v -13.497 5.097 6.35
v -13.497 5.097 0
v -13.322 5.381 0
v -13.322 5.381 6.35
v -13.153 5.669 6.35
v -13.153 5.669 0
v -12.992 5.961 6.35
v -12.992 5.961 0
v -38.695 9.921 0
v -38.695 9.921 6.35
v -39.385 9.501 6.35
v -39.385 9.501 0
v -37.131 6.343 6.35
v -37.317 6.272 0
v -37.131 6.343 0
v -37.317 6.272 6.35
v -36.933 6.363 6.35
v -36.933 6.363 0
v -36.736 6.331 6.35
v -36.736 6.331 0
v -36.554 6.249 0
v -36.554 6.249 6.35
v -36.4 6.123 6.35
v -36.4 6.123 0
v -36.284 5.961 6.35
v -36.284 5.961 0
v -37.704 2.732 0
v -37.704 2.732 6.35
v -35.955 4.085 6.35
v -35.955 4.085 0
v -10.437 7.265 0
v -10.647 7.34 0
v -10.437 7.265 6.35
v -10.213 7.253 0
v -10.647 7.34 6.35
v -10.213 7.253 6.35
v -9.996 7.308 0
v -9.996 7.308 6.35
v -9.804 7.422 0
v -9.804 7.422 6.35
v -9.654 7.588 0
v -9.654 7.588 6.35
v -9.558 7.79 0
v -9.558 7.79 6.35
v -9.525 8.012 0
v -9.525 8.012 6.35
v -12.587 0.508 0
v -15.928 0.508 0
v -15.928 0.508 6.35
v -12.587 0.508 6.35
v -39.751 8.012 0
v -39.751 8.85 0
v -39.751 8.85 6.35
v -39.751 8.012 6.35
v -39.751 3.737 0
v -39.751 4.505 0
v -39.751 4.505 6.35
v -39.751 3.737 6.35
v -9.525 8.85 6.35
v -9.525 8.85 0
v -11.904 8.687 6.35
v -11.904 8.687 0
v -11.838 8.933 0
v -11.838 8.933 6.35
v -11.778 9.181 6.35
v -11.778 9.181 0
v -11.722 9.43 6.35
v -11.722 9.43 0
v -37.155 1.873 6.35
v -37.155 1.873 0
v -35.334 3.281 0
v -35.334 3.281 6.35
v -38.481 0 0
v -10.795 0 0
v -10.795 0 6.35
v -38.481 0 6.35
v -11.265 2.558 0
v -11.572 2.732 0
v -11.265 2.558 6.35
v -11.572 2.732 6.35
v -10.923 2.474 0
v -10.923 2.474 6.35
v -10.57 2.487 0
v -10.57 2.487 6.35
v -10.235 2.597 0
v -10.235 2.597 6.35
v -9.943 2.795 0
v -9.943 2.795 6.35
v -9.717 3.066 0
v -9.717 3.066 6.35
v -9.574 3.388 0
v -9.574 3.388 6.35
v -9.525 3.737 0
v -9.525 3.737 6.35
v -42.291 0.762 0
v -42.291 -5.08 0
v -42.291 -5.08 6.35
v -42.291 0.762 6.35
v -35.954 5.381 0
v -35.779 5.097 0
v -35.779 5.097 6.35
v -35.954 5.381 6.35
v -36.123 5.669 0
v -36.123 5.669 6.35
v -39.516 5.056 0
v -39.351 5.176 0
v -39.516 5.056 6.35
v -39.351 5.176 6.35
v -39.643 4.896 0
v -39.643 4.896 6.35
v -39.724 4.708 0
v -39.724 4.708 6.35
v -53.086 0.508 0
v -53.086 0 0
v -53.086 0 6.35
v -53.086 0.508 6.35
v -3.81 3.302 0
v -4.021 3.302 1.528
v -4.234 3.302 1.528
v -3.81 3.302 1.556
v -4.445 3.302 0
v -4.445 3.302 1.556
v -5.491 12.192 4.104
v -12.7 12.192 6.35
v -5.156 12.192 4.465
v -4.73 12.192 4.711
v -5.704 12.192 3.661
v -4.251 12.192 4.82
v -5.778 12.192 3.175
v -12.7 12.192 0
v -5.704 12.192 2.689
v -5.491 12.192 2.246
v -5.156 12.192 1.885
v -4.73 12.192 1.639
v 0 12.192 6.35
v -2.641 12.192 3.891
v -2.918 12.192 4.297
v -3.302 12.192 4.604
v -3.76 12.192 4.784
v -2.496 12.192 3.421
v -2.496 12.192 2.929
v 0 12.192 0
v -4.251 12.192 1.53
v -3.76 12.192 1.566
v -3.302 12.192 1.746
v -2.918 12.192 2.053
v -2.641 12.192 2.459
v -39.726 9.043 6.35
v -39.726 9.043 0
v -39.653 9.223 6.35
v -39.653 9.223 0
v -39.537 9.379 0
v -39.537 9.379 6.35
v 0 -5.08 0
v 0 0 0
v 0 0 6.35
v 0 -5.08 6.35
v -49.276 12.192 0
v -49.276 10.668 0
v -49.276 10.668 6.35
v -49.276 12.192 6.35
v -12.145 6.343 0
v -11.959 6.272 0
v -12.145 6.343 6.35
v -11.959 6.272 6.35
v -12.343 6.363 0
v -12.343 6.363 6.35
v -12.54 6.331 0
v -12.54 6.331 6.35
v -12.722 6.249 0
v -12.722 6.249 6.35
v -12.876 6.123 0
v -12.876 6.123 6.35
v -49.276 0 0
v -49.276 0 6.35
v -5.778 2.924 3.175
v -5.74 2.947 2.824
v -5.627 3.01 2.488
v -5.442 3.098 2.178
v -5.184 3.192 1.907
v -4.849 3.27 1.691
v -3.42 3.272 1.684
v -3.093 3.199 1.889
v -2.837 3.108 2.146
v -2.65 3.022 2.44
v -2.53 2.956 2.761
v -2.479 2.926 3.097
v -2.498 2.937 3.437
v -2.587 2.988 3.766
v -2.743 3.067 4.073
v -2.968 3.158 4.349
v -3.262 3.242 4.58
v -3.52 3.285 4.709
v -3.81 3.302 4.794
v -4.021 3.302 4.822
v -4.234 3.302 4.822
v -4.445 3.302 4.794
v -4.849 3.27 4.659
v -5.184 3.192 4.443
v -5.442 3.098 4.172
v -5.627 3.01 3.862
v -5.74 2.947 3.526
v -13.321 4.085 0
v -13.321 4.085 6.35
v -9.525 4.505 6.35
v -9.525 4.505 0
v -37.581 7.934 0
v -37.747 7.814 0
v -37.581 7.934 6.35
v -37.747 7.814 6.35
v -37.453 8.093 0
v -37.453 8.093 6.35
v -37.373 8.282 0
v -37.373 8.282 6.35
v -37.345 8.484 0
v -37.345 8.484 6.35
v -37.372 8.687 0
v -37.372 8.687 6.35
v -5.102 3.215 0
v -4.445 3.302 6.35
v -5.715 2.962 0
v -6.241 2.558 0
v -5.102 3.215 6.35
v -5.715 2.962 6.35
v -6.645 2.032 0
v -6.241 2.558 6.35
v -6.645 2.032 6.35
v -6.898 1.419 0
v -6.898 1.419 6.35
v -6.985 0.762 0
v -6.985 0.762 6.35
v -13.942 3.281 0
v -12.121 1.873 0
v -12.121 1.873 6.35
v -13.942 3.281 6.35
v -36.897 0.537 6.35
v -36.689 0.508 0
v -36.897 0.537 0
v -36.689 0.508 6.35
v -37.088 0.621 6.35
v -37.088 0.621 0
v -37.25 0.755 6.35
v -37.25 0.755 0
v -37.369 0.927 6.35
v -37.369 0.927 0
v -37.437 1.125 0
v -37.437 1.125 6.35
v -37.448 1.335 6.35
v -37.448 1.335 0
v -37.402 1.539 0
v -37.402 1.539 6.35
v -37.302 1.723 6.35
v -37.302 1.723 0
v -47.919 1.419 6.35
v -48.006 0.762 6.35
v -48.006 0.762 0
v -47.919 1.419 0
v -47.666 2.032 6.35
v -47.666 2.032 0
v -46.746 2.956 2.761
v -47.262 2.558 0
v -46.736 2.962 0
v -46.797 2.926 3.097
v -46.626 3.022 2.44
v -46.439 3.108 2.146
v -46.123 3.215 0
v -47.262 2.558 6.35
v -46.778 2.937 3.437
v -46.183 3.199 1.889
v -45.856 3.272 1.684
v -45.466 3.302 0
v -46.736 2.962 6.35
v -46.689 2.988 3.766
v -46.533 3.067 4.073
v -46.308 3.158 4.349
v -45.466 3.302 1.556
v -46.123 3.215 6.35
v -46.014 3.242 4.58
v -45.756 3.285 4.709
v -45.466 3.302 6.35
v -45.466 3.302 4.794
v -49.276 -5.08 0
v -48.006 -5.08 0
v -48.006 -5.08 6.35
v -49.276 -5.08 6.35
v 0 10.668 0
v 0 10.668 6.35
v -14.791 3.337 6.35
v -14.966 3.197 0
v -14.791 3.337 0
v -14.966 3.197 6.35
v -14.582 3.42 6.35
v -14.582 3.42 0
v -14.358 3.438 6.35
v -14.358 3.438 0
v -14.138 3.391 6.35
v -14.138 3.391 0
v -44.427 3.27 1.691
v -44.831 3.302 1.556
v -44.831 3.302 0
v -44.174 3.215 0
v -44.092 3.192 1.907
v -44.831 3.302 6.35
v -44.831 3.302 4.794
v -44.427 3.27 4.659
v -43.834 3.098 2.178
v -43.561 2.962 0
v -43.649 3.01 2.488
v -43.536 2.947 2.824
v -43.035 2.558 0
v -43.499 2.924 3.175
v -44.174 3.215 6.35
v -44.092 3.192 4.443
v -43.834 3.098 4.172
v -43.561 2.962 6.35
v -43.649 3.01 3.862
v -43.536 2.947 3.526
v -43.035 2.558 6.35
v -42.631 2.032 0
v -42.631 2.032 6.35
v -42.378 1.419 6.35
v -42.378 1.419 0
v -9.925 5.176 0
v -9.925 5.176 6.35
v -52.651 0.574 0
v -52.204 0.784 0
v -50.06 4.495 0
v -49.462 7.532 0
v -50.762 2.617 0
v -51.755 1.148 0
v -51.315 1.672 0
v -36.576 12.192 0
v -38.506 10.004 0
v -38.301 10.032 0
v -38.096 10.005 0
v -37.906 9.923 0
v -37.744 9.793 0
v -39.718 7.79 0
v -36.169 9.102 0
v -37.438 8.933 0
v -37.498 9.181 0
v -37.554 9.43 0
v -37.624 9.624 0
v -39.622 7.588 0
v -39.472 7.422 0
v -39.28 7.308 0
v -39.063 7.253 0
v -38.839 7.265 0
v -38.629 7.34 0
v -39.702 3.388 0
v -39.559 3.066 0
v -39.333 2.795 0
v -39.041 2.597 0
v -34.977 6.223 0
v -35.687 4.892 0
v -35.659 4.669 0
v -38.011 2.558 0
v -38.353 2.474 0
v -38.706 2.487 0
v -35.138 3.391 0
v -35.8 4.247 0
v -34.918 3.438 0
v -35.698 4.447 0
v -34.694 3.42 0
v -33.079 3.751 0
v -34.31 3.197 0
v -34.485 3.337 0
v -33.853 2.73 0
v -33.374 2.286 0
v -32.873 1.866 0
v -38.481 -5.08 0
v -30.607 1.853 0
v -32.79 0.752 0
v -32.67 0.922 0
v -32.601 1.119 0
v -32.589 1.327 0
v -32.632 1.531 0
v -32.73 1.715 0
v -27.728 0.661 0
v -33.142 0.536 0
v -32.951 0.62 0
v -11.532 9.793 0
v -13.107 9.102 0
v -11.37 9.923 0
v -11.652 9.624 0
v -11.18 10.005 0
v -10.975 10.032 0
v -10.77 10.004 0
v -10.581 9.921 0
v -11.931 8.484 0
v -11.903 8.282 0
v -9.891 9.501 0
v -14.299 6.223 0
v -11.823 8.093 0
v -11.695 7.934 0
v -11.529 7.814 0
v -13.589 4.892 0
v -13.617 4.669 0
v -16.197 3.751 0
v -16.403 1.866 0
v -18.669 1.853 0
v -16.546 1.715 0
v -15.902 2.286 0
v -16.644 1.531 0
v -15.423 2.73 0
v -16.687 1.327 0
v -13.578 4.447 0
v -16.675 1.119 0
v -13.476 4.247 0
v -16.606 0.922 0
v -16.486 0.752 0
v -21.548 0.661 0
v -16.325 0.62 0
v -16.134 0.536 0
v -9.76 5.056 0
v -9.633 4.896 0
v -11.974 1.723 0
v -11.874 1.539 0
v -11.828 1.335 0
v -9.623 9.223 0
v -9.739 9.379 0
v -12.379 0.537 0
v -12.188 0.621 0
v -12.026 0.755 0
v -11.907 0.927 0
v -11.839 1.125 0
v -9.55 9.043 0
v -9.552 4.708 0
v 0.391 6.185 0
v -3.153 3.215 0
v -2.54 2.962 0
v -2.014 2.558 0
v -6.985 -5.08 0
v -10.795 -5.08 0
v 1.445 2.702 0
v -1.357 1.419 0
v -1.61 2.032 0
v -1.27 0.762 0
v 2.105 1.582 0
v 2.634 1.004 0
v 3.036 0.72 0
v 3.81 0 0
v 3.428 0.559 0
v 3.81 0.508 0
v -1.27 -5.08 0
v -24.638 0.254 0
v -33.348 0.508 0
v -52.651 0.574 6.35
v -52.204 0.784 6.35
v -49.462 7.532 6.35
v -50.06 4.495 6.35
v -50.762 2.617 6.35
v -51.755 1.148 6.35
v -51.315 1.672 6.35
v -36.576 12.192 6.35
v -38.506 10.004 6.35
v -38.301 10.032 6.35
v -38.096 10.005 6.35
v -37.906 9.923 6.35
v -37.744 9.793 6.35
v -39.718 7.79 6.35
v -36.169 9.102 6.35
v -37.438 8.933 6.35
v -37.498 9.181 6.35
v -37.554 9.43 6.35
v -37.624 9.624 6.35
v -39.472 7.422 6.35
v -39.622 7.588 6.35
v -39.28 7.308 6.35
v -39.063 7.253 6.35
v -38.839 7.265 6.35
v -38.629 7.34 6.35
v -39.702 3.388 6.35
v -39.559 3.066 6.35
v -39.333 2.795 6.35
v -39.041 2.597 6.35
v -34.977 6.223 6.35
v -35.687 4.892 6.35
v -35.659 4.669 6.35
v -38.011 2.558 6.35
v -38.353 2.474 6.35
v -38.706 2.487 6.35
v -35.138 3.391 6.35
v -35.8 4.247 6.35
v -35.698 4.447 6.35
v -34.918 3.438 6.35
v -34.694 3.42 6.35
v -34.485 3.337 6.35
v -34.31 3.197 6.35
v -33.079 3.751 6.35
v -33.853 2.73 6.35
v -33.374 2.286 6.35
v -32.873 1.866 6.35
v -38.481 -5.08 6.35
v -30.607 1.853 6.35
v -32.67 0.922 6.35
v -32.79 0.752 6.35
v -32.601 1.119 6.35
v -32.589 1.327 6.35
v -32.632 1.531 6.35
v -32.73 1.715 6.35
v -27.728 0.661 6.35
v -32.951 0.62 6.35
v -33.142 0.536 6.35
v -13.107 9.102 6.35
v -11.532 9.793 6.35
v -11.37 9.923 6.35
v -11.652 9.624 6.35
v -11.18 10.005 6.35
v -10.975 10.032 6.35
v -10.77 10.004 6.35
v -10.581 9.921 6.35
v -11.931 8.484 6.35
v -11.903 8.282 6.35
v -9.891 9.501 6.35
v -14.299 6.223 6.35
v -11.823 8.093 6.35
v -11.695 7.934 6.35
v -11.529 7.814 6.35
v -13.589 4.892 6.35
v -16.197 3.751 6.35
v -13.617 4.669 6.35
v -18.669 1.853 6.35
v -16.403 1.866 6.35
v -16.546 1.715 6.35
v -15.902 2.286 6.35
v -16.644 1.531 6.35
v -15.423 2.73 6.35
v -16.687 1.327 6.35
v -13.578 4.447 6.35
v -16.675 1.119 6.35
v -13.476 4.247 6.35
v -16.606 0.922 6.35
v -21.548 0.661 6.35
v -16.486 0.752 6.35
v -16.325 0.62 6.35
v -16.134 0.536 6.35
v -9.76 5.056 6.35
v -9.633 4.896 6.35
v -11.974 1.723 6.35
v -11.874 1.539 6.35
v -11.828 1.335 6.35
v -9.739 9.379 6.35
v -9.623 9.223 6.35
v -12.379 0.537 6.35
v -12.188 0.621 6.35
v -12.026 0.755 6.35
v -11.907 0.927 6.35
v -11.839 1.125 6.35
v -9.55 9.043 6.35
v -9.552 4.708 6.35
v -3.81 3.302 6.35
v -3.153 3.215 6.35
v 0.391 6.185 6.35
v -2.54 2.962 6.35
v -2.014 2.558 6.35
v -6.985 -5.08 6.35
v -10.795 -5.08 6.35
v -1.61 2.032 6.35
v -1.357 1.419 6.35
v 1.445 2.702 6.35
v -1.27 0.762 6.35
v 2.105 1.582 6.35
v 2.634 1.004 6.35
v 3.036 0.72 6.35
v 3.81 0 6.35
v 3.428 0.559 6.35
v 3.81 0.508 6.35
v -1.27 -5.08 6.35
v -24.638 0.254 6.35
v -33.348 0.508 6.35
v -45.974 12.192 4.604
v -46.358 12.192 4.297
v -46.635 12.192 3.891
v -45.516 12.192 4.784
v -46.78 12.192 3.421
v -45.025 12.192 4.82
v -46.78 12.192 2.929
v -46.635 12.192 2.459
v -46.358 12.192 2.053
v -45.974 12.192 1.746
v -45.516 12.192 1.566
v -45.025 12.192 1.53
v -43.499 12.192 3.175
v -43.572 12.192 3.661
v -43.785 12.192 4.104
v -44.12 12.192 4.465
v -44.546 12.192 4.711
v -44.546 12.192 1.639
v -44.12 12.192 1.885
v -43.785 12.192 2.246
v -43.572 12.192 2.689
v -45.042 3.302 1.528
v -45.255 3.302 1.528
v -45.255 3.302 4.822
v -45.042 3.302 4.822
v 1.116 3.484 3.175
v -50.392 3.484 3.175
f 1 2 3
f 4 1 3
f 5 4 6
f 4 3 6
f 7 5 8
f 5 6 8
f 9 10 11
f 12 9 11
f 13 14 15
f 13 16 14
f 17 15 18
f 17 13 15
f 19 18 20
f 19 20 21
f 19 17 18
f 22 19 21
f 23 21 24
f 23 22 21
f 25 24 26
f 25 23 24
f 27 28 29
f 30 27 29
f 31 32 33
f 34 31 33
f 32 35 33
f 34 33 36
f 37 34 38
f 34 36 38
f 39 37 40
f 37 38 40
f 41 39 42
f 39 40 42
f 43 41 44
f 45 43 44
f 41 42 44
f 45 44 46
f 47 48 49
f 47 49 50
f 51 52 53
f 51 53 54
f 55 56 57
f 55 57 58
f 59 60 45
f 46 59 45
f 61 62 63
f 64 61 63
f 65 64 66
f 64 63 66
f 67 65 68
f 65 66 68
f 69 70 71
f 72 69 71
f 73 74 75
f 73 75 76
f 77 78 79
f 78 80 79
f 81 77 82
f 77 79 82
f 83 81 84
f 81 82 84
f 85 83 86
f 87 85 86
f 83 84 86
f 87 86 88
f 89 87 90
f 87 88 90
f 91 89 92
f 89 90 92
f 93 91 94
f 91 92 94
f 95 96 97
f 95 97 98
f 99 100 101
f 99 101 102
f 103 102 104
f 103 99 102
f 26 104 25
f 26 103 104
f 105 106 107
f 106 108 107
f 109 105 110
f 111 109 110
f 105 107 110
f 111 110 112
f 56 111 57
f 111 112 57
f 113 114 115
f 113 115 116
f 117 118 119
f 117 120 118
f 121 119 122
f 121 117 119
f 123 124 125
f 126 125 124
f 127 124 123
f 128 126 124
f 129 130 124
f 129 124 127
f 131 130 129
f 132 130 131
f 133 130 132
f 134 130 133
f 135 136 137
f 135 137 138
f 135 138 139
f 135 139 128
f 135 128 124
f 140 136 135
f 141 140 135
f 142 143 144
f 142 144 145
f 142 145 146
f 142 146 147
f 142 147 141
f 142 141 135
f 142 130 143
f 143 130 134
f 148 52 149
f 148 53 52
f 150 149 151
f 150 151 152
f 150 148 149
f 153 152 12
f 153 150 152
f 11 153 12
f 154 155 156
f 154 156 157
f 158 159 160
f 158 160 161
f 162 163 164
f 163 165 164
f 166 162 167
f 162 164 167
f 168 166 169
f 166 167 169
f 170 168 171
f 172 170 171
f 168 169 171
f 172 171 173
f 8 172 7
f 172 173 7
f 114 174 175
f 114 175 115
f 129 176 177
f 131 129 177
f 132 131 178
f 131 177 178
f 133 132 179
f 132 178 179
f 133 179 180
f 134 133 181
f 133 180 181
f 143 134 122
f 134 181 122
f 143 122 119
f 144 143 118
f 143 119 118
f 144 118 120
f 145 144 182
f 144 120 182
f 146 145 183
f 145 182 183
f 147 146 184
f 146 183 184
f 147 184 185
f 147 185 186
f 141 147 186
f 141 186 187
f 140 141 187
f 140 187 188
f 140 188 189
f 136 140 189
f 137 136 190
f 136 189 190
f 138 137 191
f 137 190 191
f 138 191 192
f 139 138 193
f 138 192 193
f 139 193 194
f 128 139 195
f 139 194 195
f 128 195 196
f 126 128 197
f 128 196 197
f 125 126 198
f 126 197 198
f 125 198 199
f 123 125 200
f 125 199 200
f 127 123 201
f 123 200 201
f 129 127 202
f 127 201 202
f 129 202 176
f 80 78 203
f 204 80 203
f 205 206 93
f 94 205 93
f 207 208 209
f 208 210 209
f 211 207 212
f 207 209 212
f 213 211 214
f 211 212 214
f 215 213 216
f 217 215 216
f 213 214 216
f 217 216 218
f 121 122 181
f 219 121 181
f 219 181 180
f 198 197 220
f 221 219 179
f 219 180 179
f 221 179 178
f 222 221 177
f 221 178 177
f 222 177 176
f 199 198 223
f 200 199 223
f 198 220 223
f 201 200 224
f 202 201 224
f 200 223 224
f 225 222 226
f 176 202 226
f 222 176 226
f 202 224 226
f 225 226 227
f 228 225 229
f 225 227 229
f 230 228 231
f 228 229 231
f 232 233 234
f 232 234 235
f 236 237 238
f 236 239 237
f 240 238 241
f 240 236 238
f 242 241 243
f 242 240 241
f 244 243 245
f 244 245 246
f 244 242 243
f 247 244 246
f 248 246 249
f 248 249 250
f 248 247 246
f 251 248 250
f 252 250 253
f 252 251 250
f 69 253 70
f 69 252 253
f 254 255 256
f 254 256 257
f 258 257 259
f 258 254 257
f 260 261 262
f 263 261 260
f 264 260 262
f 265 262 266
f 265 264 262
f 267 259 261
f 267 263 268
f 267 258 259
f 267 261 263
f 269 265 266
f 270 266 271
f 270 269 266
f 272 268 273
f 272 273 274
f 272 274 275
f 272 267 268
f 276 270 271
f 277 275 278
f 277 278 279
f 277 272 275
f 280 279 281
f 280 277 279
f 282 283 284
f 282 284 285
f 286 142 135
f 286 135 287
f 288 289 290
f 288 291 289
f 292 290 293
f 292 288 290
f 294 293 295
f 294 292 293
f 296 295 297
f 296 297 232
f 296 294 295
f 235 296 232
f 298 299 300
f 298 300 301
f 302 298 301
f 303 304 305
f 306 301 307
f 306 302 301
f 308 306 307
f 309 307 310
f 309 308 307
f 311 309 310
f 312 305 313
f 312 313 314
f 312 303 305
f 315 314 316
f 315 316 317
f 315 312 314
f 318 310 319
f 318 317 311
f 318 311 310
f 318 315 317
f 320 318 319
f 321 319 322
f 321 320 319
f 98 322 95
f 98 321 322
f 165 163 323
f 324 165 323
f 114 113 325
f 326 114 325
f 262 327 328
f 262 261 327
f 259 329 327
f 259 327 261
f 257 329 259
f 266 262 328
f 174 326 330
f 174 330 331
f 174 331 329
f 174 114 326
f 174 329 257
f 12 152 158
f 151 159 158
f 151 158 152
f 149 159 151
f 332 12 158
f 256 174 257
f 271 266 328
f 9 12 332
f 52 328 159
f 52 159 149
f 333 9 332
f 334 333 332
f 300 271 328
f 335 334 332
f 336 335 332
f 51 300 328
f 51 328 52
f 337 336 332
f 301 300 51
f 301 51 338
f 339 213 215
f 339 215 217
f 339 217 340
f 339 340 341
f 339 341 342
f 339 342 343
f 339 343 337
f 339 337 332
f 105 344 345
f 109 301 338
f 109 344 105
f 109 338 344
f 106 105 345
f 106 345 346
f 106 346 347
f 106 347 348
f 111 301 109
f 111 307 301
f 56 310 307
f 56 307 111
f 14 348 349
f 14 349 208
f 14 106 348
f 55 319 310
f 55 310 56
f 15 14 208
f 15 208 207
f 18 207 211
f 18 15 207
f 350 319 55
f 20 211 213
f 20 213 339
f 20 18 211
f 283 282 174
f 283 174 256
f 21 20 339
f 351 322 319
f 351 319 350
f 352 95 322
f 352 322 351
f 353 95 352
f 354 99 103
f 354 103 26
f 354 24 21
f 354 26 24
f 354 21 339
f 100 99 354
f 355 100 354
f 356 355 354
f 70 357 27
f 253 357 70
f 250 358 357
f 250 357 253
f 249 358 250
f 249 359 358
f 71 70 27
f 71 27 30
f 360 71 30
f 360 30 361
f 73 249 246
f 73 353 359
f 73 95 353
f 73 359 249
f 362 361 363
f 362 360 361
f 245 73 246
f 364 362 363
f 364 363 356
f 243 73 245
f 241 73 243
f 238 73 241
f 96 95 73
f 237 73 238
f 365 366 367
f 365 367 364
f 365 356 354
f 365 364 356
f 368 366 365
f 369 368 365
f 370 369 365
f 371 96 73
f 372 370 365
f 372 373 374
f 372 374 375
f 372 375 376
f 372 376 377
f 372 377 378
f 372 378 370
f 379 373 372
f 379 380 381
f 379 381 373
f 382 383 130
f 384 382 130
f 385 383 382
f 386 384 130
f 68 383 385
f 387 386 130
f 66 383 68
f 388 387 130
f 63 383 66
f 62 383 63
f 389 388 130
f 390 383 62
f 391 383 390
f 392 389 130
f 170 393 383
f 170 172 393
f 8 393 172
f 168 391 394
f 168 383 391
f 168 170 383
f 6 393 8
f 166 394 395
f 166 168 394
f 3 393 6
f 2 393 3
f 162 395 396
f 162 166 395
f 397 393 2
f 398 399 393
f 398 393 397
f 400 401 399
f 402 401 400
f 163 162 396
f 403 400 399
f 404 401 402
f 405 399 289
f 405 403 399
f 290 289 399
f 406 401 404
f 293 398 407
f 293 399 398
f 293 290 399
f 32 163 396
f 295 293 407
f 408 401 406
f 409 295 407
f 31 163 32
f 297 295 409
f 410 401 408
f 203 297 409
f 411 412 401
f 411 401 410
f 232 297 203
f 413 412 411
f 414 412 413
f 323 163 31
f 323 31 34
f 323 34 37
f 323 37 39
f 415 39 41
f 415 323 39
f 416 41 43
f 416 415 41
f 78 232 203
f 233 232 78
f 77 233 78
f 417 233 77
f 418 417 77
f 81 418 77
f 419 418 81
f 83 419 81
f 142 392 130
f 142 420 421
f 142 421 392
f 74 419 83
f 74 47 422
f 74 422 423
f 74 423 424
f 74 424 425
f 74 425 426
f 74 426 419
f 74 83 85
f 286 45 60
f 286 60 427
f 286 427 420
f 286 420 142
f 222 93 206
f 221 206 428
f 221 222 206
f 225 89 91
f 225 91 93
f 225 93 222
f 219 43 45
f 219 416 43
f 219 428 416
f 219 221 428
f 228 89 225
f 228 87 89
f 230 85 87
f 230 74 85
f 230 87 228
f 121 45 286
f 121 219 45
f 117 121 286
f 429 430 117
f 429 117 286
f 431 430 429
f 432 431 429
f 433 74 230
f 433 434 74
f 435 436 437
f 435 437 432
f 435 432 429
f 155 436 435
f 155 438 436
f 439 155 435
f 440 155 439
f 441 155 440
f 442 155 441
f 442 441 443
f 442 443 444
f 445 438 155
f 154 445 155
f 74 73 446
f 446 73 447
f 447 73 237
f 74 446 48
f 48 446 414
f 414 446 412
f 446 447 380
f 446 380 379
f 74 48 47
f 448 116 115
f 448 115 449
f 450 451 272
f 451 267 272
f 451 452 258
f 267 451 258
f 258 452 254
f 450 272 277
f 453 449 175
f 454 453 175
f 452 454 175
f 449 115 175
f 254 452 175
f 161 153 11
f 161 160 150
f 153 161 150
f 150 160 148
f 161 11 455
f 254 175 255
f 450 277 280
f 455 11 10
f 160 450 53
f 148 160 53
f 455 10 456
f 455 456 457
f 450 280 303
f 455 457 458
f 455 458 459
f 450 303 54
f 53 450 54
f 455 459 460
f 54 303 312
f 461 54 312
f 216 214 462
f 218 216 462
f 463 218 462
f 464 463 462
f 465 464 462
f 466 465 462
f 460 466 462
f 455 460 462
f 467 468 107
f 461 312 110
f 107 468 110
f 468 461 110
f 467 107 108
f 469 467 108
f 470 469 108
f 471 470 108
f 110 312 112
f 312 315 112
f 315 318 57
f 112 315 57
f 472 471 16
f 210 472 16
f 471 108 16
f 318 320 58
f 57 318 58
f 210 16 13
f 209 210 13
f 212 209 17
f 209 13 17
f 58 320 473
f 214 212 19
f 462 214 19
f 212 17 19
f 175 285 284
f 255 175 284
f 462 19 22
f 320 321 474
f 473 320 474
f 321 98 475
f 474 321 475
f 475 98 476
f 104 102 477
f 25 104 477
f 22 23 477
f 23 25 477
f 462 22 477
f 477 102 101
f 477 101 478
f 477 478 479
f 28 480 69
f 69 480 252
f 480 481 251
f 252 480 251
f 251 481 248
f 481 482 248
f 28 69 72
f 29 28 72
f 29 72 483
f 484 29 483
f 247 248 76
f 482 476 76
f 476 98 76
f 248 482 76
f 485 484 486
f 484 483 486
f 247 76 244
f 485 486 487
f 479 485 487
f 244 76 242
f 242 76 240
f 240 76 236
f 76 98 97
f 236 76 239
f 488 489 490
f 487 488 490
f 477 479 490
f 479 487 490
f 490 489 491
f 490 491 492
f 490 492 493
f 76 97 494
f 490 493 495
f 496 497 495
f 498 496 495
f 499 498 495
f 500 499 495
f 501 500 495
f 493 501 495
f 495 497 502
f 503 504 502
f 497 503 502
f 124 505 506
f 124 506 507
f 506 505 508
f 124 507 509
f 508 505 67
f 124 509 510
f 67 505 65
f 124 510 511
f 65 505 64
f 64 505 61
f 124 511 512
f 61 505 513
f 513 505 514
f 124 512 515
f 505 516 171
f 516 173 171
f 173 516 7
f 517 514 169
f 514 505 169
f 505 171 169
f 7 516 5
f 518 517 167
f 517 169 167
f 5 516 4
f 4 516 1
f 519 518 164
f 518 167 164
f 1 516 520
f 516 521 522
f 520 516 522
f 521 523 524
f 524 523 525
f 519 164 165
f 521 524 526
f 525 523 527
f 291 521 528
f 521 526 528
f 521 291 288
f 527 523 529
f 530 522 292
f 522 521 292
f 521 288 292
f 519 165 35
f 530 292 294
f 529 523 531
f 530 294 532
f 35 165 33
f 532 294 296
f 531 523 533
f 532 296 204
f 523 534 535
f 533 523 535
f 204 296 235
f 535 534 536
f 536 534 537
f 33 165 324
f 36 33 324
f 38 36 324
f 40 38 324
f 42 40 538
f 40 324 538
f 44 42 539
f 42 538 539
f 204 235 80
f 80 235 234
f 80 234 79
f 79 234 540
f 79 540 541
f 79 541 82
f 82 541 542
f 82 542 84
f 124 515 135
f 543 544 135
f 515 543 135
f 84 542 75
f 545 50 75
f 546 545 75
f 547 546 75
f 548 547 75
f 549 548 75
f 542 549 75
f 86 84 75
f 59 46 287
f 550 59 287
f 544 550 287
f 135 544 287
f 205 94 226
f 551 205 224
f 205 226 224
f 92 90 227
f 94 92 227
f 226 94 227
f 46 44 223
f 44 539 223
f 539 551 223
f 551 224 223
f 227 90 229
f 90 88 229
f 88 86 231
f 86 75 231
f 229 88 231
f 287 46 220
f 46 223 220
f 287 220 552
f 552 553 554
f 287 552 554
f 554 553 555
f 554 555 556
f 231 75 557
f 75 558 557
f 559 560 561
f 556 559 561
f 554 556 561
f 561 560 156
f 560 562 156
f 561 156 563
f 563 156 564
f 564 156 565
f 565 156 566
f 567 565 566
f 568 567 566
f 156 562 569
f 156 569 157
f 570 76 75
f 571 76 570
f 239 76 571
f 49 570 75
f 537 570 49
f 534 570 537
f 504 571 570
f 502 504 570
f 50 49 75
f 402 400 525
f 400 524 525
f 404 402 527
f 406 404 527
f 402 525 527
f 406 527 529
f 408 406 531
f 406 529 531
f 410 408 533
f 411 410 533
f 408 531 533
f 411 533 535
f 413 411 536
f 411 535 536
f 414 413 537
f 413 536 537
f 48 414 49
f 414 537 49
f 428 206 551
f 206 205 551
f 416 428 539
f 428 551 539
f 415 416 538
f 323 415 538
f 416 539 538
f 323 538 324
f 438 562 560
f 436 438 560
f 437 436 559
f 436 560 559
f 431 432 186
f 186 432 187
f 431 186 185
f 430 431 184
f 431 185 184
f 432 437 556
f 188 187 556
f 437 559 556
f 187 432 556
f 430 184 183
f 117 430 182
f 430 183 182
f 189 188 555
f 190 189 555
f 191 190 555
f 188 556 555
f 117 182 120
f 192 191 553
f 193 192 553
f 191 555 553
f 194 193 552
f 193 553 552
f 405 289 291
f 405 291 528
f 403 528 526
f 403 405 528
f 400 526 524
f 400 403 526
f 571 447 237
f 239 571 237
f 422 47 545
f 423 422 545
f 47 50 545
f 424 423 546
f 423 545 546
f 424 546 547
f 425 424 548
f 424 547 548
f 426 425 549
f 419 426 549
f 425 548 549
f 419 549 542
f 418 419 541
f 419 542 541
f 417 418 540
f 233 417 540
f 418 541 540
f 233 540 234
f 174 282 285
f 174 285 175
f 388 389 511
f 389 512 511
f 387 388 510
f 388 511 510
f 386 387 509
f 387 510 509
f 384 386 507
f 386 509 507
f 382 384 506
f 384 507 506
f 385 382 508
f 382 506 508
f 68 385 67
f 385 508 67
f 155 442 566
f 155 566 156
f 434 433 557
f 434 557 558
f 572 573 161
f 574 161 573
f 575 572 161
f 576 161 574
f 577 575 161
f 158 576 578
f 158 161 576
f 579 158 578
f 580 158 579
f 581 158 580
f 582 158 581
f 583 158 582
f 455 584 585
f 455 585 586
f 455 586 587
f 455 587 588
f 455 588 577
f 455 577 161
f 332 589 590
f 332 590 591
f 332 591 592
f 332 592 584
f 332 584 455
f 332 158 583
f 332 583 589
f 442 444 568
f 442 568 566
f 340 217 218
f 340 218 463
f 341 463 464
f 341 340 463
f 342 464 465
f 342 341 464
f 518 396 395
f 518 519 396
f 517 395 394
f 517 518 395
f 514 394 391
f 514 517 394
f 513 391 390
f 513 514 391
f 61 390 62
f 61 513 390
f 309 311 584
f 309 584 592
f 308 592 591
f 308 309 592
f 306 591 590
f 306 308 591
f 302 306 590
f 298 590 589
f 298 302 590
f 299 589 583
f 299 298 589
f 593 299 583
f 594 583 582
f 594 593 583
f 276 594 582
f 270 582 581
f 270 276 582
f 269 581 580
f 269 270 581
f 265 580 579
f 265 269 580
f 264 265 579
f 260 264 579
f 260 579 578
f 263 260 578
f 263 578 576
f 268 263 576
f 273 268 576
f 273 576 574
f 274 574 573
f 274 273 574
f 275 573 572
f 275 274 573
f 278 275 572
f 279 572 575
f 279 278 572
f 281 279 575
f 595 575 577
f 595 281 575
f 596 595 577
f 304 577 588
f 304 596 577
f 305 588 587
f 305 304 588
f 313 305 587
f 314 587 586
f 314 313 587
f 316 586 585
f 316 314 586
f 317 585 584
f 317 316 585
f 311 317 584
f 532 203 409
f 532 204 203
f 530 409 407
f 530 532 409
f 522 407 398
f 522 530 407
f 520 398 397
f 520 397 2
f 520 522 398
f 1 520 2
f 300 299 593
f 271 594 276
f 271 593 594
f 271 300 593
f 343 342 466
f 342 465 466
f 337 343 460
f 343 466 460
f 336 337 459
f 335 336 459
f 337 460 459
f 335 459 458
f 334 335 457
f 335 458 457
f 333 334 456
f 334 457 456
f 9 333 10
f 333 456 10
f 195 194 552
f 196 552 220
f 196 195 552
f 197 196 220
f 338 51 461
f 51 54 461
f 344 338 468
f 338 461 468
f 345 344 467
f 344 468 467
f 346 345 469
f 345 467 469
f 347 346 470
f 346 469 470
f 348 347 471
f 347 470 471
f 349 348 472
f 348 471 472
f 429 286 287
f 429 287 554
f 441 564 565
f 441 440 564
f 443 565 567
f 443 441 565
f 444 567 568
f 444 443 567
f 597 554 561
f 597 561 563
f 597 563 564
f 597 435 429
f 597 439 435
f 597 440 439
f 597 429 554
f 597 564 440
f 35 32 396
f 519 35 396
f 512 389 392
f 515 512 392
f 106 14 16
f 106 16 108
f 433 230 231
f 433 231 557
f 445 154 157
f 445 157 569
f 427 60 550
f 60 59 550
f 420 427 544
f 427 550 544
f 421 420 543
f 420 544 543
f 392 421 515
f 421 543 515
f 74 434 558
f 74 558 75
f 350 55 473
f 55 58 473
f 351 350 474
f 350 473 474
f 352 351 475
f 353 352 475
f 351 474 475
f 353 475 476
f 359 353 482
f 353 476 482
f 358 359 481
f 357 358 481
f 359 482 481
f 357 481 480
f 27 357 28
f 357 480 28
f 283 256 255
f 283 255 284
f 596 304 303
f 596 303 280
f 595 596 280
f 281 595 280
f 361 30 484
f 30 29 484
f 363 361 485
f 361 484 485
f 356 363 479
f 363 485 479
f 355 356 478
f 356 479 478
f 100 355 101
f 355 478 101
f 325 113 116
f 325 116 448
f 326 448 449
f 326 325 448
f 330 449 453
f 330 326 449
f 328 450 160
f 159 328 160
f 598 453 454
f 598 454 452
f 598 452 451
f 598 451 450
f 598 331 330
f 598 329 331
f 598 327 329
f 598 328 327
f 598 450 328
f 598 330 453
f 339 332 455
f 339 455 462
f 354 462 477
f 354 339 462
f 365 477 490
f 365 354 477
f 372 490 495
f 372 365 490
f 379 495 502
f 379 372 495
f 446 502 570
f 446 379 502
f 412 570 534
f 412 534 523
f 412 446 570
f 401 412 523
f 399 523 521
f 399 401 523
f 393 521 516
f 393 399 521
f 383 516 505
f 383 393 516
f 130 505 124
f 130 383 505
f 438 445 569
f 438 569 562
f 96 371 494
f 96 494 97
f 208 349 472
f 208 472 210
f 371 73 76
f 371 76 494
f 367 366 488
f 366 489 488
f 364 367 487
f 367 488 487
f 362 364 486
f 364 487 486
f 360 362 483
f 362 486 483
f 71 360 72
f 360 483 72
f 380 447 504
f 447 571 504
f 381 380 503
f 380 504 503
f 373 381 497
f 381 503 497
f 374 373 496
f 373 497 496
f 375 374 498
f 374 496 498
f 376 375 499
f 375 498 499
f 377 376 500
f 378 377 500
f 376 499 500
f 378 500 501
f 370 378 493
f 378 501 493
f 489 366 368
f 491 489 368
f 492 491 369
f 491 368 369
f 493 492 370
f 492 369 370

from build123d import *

# Parameters (mm, degrees)
BOSS_EXTRUDE1_DEPTH   = 6.35
FILLET2_R             = 2.54
FILLET5_SIZE          = 10.16
FILLET5_SIZE_2        = 3.81
FILLET3_R             = 0.762
FILLET4_R             = 1.27
M4X0_7_TAPPED_HOLE1_D = 3.3


with BuildPart() as part:
    # Sketch1 → Boss-Extrude1 (new body)
    with BuildSketch(Plane.XY):
        with BuildLine():
            Line((-49.276, 0.508), (-49.276, 12.192))
            Line((-49.276, 12.192), (-36.576, 12.192))
            ThreePointArc((-36.576, 12.192), (-24.638, 0.254), (-12.7, 12.192))
            Line((-12.7, 12.192), (0, 12.192))
            Line((0, 12.192), (0, 0.508))
            Line((0, 0.508), (3.81, 0.508))
            Line((3.81, 0.508), (3.81, 0))
            Line((3.81, 0), (0, 0))
            Line((0, 0), (0, -5.08))
            Line((0, -5.08), (-1.27, -5.08))
            Line((-1.27, -5.08), (-1.27, 3.302))
            Line((-1.27, 3.302), (-6.985, 3.302))
            Line((-6.985, 3.302), (-6.985, -5.08))
            Line((-6.985, -5.08), (-10.795, -5.08))
            Line((-10.795, -5.08), (-10.795, 0))
            Line((-10.795, 0), (-38.481, 0))
            Line((-38.481, 0), (-38.481, -5.08))
            Line((-38.481, -5.08), (-42.291, -5.08))
            Line((-42.291, -5.08), (-42.291, 3.302))
            Line((-42.291, 3.302), (-48.006, 3.302))
            Line((-48.006, 3.302), (-48.006, -5.08))
            Line((-48.006, -5.08), (-49.276, -5.08))
            Line((-49.276, -5.08), (-49.276, 0))
            Line((-49.276, 0), (-53.086, 0))
            Line((-53.086, 0), (-53.086, 0.508))
            Line((-53.086, 0.508), (-49.276, 0.508))
        make_face()
        with BuildLine():
            Line((-18.478827328, 0.508), (-10.355558408, 0.508))
            Line((-10.355558408, 0.508), (-14.507082252, 3.71758146))
            ThreePointArc((-14.507082252, 3.71758146), (-16.336366742, 1.919018483), (-18.478827328, 0.508))
        make_face(mode=Mode.SUBTRACT)
        with BuildLine():
            Line((-9.525, 1.150112382), (-13.88565937, 4.52137845))
            ThreePointArc((-13.88565937, 4.52137845), (-13.218881773, 5.554605714), (-12.651085576, 6.645366193))
            Line((-12.651085576, 6.645366193), (-9.525, 4.960112382))
            Line((-9.525, 4.960112382), (-9.525, 1.150112382))
        make_face(mode=Mode.SUBTRACT)
        with BuildLine():
            Line((-9.525, 6.738112382), (-12.07736066, 8.107688139))
            ThreePointArc((-12.07736066, 8.107688139), (-11.751952055, 9.293546556), (-11.53824026, 10.504528889))
            Line((-11.53824026, 10.504528889), (-9.525, 9.278112382))
            Line((-9.525, 9.278112382), (-9.525, 6.738112382))
        make_face(mode=Mode.SUBTRACT)
        with BuildLine():
            Line((-39.751, 9.278112382), (-39.751, 6.738112382))
            Line((-39.751, 6.738112382), (-37.19863934, 8.107688139))
            ThreePointArc((-37.19863934, 8.107688139), (-37.524047945, 9.293546556), (-37.73775974, 10.504528889))
            Line((-37.73775974, 10.504528889), (-39.751, 9.278112382))
        make_face(mode=Mode.SUBTRACT)
        with BuildLine():
            Line((-39.751, 4.960112382), (-39.751, 1.150112382))
            Line((-39.751, 1.150112382), (-35.39034063, 4.52137845))
            ThreePointArc((-35.39034063, 4.52137845), (-36.057118227, 5.554605714), (-36.624914424, 6.645366193))
            Line((-36.624914424, 6.645366193), (-39.751, 4.960112382))
        make_face(mode=Mode.SUBTRACT)
        with BuildLine():
            Line((-30.797172672, 0.508), (-38.920441592, 0.508))
            Line((-38.920441592, 0.508), (-34.768917748, 3.71758146))
            ThreePointArc((-34.768917748, 3.71758146), (-32.939633258, 1.919018483), (-30.797172672, 0.508))
        make_face(mode=Mode.SUBTRACT)
    extrude(amount=BOSS_EXTRUDE1_DEPTH)

    # Fillet2
    fillet2_edges = [part.edges().sort_by_distance(p)[0] for p in [
        (-1.27, 3.302, 3.175),
        (-6.985, 3.302, 3.175),
        (-42.291, 3.302, 3.175),
        (-48.006, 3.302, 3.175),
    ]]
    fillet(fillet2_edges, radius=FILLET2_R)

    # Fillet5
    # an asymmetric fillet: 10.16, 3.81 mm, written as the material it adds along each edge
    with BuildSketch(Plane(origin=(0, 0.508, 0), x_dir=(0, 1, 0), z_dir=(0, 0, 1))) as fillet5_piece_1:
        with BuildLine():
            Bezier((FILLET5_SIZE, 0), (0, 0), (0, -FILLET5_SIZE_2), weights=[1, 0.707106781, 1])
            Line((0, -FILLET5_SIZE_2), (0, 0))
            Line((0, 0), (FILLET5_SIZE, 0))
        make_face()
    extrude(amount=6.35)
    with BuildSketch(Plane(origin=(-49.276, 0.508, 0), x_dir=(-1, 0, 0), z_dir=(0, 0, 1))) as fillet5_piece_2:
        with BuildLine():
            Bezier((FILLET5_SIZE_2, 0), (0, 0), (0, -FILLET5_SIZE), weights=[1, 0.707106781, 1])
            Line((0, -FILLET5_SIZE), (0, 0))
            Line((0, 0), (FILLET5_SIZE_2, 0))
        make_face()
    extrude(amount=6.35)

    # Fillet3
    fillet3_edges = [part.edges().sort_by_distance(p)[0] for p in [
        (-9.525, 6.738112382, 3.175),
        (-9.525, 9.278112382, 3.175),
        (-11.53824026, 10.504528889, 3.175),
        (-12.07736066, 8.107688139, 3.175),
        (-36.624914424, 6.645366193, 3.175),
        (-39.751, 4.960112382, 3.175),
        (-35.39034063, 4.52137845, 3.175),
        (-30.797172672, 0.508, 3.175),
        (-34.768917748, 3.71758146, 3.175),
        (-38.920441592, 0.508, 3.175),
        (-14.507082252, 3.71758146, 3.175),
        (-18.478827328, 0.508, 3.175),
        (-10.355558408, 0.508, 3.175),
        (-37.73775974, 10.504528889, 3.175),
        (-39.751, 9.278112382, 3.175),
        (-39.751, 6.738112382, 3.175),
        (-37.19863934, 8.107688139, 3.175),
        (-9.525, 4.960112382, 3.175),
        (-12.651085576, 6.645366193, 3.175),
        (-13.88565937, 4.52137845, 3.175),
    ]]
    fillet(fillet3_edges, radius=FILLET3_R)

    # Fillet4
    fillet4_edges = [part.edges().sort_by_distance(p)[0] for p in [
        (-39.751, 1.150112382, 3.175),
        (-9.525, 1.150112382, 3.175),
    ]]
    fillet(fillet4_edges, radius=FILLET4_R)

    # M4x0.7 Tapped Hole1 (through all)
    with Locations(Plane(origin=(0, 12.192, 0), x_dir=(1, 0, 0), z_dir=(0, 1, 0))):
        with Locations((-4.1275, -3.175)):
            m4x0_7_tapped_hole1 = Hole(M4X0_7_TAPPED_HOLE1_D / 2)

    # Mirror1: M4x0.7 Tapped Hole1 across plane
    add(m4x0_7_tapped_hole1.mirror(Plane(origin=(-24.638, 0, 0), x_dir=(0, 0, 1), z_dir=(1, 0, 0))), mode=Mode.SUBTRACT)


solid = part.part
